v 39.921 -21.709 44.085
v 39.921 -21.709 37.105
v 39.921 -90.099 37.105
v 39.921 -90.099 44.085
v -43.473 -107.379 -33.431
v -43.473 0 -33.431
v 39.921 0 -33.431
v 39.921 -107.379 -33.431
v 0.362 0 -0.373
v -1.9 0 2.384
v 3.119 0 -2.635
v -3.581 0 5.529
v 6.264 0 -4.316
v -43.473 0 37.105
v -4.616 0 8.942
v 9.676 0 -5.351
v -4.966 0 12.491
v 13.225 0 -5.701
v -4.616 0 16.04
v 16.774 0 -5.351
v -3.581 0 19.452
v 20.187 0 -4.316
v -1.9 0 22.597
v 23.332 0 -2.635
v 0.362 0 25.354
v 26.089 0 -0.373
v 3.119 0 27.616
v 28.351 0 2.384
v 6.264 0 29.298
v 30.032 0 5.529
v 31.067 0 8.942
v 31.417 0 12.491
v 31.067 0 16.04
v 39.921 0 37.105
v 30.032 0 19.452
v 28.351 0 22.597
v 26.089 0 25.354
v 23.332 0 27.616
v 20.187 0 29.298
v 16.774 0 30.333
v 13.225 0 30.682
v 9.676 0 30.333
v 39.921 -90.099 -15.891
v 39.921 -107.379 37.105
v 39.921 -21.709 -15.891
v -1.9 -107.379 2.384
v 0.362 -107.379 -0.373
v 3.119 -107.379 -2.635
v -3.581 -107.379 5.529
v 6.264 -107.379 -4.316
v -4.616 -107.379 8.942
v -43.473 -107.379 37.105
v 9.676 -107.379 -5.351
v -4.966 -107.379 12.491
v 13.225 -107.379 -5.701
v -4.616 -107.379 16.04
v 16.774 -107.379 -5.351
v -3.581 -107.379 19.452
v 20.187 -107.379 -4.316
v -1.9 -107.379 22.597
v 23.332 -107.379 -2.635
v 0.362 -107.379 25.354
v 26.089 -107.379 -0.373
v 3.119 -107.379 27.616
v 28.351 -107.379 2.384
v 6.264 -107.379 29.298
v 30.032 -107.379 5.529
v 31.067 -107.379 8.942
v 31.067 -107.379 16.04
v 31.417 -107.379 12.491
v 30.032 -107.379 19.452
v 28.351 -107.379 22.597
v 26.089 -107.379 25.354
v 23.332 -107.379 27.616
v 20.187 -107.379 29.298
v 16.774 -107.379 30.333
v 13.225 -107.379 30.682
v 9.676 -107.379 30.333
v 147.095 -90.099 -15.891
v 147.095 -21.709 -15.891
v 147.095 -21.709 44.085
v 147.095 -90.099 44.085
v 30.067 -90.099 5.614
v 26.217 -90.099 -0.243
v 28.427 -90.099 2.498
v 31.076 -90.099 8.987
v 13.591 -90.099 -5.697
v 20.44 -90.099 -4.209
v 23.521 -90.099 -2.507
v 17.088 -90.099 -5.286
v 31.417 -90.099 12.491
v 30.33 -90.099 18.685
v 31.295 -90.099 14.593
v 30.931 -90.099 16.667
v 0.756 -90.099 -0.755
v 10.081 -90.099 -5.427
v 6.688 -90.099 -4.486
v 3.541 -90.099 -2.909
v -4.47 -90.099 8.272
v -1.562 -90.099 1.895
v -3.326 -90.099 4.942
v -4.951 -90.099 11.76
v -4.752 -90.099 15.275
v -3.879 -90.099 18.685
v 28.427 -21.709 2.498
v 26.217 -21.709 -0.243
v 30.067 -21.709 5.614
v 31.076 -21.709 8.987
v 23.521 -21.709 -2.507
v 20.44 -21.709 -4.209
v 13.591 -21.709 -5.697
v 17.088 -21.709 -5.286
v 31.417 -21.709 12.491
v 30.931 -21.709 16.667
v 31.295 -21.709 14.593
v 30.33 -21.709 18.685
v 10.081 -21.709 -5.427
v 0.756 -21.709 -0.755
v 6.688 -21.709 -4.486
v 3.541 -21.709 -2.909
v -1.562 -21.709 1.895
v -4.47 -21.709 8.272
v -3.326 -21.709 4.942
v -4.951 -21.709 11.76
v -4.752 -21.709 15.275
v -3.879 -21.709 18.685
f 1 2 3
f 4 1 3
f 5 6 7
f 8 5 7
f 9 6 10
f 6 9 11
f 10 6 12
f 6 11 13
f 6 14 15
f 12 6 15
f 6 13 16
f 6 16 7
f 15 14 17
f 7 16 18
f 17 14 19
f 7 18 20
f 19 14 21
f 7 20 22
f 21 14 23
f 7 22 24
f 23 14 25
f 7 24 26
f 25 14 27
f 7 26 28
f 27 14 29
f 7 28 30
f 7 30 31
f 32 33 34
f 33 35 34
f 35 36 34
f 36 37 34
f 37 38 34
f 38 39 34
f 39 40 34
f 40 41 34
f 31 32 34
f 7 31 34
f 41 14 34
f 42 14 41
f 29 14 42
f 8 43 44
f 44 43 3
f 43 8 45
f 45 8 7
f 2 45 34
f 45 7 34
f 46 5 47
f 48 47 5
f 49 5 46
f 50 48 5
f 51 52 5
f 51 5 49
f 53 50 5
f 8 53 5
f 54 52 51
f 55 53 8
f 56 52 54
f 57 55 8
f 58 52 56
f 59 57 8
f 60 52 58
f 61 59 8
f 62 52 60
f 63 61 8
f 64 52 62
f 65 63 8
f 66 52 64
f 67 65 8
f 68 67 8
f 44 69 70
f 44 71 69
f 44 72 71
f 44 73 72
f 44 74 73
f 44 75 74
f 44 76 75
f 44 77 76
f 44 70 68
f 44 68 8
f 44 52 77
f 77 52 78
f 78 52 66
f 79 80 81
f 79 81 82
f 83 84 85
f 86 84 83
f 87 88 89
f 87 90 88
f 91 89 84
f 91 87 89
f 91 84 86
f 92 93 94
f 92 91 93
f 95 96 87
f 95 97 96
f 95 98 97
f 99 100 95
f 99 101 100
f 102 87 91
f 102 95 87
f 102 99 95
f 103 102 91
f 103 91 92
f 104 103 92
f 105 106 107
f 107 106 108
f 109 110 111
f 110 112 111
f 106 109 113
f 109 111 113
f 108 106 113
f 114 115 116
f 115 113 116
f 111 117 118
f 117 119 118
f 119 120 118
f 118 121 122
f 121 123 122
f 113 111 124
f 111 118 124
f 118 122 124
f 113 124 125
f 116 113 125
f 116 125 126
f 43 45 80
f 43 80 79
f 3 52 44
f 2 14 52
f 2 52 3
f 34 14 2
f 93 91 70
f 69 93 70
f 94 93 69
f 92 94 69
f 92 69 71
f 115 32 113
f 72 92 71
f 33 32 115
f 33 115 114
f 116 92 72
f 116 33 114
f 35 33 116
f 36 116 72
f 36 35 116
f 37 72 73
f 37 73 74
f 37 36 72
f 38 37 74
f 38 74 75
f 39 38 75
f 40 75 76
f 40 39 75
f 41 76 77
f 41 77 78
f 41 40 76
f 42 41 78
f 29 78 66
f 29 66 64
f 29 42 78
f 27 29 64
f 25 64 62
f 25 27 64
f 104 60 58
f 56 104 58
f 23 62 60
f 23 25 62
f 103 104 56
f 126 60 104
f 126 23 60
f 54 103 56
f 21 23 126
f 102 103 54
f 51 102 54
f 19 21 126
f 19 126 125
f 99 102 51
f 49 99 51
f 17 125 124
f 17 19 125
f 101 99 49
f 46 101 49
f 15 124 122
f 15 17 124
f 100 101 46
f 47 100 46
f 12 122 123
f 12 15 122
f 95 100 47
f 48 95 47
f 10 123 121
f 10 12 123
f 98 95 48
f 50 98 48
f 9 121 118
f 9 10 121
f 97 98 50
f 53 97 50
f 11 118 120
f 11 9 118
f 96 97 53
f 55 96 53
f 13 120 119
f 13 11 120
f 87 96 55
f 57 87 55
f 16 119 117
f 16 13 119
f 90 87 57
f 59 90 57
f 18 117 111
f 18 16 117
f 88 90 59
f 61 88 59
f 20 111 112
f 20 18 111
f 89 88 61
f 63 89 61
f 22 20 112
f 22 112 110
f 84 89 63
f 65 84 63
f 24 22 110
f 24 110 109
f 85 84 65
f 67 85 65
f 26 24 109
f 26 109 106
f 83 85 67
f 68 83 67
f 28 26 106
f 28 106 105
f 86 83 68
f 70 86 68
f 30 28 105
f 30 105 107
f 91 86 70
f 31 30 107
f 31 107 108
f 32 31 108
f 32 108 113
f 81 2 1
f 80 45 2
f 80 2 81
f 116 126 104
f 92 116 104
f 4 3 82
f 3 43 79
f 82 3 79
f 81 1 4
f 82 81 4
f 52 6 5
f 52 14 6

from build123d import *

# Parameters (mm, degrees)
F1_W     = 83.3939239383
F1_H     = 70.5358162522
F1_R     = 18.1915256805
F2_DEPTH = 107.3792502284
F3_W     = 68.390481174
F3_H     = 34.5757827163
F4_DEPTH = 190.568074584
F5_DEPTH = 25.4


with BuildPart() as f2:
    # F1 (on face) → F2 (new body)
    with BuildSketch(Plane.XZ):
        with Locations((-1.7756335437, 1.8368847668)):
            Rectangle(F1_W, F1_H)
        with Locations((13.2254809141, 12.4907270074)):
            Circle(F1_R, mode=Mode.SUBTRACT)
    extrude(amount=F2_DEPTH)

    # F3 (on face) → F4 (join)
    with BuildSketch(Plane(origin=(-43.4725955129, 0, 0), x_dir=(0, -1, 0), z_dir=(-1, 0, 0))):
        with Locations((55.904109031, 1.3973750174)):
            Rectangle(F3_W, F3_H)
    extrude(amount=-F4_DEPTH)

    # F5 (add): a face of the model
    f5_faces = [f2.faces().sort_by_distance(p)[0] for p in [
        (93.5084037483, -55.904109031, 18.6852663755),
    ]]
    extrude(f5_faces, amount=F5_DEPTH)


solid = f2.part
